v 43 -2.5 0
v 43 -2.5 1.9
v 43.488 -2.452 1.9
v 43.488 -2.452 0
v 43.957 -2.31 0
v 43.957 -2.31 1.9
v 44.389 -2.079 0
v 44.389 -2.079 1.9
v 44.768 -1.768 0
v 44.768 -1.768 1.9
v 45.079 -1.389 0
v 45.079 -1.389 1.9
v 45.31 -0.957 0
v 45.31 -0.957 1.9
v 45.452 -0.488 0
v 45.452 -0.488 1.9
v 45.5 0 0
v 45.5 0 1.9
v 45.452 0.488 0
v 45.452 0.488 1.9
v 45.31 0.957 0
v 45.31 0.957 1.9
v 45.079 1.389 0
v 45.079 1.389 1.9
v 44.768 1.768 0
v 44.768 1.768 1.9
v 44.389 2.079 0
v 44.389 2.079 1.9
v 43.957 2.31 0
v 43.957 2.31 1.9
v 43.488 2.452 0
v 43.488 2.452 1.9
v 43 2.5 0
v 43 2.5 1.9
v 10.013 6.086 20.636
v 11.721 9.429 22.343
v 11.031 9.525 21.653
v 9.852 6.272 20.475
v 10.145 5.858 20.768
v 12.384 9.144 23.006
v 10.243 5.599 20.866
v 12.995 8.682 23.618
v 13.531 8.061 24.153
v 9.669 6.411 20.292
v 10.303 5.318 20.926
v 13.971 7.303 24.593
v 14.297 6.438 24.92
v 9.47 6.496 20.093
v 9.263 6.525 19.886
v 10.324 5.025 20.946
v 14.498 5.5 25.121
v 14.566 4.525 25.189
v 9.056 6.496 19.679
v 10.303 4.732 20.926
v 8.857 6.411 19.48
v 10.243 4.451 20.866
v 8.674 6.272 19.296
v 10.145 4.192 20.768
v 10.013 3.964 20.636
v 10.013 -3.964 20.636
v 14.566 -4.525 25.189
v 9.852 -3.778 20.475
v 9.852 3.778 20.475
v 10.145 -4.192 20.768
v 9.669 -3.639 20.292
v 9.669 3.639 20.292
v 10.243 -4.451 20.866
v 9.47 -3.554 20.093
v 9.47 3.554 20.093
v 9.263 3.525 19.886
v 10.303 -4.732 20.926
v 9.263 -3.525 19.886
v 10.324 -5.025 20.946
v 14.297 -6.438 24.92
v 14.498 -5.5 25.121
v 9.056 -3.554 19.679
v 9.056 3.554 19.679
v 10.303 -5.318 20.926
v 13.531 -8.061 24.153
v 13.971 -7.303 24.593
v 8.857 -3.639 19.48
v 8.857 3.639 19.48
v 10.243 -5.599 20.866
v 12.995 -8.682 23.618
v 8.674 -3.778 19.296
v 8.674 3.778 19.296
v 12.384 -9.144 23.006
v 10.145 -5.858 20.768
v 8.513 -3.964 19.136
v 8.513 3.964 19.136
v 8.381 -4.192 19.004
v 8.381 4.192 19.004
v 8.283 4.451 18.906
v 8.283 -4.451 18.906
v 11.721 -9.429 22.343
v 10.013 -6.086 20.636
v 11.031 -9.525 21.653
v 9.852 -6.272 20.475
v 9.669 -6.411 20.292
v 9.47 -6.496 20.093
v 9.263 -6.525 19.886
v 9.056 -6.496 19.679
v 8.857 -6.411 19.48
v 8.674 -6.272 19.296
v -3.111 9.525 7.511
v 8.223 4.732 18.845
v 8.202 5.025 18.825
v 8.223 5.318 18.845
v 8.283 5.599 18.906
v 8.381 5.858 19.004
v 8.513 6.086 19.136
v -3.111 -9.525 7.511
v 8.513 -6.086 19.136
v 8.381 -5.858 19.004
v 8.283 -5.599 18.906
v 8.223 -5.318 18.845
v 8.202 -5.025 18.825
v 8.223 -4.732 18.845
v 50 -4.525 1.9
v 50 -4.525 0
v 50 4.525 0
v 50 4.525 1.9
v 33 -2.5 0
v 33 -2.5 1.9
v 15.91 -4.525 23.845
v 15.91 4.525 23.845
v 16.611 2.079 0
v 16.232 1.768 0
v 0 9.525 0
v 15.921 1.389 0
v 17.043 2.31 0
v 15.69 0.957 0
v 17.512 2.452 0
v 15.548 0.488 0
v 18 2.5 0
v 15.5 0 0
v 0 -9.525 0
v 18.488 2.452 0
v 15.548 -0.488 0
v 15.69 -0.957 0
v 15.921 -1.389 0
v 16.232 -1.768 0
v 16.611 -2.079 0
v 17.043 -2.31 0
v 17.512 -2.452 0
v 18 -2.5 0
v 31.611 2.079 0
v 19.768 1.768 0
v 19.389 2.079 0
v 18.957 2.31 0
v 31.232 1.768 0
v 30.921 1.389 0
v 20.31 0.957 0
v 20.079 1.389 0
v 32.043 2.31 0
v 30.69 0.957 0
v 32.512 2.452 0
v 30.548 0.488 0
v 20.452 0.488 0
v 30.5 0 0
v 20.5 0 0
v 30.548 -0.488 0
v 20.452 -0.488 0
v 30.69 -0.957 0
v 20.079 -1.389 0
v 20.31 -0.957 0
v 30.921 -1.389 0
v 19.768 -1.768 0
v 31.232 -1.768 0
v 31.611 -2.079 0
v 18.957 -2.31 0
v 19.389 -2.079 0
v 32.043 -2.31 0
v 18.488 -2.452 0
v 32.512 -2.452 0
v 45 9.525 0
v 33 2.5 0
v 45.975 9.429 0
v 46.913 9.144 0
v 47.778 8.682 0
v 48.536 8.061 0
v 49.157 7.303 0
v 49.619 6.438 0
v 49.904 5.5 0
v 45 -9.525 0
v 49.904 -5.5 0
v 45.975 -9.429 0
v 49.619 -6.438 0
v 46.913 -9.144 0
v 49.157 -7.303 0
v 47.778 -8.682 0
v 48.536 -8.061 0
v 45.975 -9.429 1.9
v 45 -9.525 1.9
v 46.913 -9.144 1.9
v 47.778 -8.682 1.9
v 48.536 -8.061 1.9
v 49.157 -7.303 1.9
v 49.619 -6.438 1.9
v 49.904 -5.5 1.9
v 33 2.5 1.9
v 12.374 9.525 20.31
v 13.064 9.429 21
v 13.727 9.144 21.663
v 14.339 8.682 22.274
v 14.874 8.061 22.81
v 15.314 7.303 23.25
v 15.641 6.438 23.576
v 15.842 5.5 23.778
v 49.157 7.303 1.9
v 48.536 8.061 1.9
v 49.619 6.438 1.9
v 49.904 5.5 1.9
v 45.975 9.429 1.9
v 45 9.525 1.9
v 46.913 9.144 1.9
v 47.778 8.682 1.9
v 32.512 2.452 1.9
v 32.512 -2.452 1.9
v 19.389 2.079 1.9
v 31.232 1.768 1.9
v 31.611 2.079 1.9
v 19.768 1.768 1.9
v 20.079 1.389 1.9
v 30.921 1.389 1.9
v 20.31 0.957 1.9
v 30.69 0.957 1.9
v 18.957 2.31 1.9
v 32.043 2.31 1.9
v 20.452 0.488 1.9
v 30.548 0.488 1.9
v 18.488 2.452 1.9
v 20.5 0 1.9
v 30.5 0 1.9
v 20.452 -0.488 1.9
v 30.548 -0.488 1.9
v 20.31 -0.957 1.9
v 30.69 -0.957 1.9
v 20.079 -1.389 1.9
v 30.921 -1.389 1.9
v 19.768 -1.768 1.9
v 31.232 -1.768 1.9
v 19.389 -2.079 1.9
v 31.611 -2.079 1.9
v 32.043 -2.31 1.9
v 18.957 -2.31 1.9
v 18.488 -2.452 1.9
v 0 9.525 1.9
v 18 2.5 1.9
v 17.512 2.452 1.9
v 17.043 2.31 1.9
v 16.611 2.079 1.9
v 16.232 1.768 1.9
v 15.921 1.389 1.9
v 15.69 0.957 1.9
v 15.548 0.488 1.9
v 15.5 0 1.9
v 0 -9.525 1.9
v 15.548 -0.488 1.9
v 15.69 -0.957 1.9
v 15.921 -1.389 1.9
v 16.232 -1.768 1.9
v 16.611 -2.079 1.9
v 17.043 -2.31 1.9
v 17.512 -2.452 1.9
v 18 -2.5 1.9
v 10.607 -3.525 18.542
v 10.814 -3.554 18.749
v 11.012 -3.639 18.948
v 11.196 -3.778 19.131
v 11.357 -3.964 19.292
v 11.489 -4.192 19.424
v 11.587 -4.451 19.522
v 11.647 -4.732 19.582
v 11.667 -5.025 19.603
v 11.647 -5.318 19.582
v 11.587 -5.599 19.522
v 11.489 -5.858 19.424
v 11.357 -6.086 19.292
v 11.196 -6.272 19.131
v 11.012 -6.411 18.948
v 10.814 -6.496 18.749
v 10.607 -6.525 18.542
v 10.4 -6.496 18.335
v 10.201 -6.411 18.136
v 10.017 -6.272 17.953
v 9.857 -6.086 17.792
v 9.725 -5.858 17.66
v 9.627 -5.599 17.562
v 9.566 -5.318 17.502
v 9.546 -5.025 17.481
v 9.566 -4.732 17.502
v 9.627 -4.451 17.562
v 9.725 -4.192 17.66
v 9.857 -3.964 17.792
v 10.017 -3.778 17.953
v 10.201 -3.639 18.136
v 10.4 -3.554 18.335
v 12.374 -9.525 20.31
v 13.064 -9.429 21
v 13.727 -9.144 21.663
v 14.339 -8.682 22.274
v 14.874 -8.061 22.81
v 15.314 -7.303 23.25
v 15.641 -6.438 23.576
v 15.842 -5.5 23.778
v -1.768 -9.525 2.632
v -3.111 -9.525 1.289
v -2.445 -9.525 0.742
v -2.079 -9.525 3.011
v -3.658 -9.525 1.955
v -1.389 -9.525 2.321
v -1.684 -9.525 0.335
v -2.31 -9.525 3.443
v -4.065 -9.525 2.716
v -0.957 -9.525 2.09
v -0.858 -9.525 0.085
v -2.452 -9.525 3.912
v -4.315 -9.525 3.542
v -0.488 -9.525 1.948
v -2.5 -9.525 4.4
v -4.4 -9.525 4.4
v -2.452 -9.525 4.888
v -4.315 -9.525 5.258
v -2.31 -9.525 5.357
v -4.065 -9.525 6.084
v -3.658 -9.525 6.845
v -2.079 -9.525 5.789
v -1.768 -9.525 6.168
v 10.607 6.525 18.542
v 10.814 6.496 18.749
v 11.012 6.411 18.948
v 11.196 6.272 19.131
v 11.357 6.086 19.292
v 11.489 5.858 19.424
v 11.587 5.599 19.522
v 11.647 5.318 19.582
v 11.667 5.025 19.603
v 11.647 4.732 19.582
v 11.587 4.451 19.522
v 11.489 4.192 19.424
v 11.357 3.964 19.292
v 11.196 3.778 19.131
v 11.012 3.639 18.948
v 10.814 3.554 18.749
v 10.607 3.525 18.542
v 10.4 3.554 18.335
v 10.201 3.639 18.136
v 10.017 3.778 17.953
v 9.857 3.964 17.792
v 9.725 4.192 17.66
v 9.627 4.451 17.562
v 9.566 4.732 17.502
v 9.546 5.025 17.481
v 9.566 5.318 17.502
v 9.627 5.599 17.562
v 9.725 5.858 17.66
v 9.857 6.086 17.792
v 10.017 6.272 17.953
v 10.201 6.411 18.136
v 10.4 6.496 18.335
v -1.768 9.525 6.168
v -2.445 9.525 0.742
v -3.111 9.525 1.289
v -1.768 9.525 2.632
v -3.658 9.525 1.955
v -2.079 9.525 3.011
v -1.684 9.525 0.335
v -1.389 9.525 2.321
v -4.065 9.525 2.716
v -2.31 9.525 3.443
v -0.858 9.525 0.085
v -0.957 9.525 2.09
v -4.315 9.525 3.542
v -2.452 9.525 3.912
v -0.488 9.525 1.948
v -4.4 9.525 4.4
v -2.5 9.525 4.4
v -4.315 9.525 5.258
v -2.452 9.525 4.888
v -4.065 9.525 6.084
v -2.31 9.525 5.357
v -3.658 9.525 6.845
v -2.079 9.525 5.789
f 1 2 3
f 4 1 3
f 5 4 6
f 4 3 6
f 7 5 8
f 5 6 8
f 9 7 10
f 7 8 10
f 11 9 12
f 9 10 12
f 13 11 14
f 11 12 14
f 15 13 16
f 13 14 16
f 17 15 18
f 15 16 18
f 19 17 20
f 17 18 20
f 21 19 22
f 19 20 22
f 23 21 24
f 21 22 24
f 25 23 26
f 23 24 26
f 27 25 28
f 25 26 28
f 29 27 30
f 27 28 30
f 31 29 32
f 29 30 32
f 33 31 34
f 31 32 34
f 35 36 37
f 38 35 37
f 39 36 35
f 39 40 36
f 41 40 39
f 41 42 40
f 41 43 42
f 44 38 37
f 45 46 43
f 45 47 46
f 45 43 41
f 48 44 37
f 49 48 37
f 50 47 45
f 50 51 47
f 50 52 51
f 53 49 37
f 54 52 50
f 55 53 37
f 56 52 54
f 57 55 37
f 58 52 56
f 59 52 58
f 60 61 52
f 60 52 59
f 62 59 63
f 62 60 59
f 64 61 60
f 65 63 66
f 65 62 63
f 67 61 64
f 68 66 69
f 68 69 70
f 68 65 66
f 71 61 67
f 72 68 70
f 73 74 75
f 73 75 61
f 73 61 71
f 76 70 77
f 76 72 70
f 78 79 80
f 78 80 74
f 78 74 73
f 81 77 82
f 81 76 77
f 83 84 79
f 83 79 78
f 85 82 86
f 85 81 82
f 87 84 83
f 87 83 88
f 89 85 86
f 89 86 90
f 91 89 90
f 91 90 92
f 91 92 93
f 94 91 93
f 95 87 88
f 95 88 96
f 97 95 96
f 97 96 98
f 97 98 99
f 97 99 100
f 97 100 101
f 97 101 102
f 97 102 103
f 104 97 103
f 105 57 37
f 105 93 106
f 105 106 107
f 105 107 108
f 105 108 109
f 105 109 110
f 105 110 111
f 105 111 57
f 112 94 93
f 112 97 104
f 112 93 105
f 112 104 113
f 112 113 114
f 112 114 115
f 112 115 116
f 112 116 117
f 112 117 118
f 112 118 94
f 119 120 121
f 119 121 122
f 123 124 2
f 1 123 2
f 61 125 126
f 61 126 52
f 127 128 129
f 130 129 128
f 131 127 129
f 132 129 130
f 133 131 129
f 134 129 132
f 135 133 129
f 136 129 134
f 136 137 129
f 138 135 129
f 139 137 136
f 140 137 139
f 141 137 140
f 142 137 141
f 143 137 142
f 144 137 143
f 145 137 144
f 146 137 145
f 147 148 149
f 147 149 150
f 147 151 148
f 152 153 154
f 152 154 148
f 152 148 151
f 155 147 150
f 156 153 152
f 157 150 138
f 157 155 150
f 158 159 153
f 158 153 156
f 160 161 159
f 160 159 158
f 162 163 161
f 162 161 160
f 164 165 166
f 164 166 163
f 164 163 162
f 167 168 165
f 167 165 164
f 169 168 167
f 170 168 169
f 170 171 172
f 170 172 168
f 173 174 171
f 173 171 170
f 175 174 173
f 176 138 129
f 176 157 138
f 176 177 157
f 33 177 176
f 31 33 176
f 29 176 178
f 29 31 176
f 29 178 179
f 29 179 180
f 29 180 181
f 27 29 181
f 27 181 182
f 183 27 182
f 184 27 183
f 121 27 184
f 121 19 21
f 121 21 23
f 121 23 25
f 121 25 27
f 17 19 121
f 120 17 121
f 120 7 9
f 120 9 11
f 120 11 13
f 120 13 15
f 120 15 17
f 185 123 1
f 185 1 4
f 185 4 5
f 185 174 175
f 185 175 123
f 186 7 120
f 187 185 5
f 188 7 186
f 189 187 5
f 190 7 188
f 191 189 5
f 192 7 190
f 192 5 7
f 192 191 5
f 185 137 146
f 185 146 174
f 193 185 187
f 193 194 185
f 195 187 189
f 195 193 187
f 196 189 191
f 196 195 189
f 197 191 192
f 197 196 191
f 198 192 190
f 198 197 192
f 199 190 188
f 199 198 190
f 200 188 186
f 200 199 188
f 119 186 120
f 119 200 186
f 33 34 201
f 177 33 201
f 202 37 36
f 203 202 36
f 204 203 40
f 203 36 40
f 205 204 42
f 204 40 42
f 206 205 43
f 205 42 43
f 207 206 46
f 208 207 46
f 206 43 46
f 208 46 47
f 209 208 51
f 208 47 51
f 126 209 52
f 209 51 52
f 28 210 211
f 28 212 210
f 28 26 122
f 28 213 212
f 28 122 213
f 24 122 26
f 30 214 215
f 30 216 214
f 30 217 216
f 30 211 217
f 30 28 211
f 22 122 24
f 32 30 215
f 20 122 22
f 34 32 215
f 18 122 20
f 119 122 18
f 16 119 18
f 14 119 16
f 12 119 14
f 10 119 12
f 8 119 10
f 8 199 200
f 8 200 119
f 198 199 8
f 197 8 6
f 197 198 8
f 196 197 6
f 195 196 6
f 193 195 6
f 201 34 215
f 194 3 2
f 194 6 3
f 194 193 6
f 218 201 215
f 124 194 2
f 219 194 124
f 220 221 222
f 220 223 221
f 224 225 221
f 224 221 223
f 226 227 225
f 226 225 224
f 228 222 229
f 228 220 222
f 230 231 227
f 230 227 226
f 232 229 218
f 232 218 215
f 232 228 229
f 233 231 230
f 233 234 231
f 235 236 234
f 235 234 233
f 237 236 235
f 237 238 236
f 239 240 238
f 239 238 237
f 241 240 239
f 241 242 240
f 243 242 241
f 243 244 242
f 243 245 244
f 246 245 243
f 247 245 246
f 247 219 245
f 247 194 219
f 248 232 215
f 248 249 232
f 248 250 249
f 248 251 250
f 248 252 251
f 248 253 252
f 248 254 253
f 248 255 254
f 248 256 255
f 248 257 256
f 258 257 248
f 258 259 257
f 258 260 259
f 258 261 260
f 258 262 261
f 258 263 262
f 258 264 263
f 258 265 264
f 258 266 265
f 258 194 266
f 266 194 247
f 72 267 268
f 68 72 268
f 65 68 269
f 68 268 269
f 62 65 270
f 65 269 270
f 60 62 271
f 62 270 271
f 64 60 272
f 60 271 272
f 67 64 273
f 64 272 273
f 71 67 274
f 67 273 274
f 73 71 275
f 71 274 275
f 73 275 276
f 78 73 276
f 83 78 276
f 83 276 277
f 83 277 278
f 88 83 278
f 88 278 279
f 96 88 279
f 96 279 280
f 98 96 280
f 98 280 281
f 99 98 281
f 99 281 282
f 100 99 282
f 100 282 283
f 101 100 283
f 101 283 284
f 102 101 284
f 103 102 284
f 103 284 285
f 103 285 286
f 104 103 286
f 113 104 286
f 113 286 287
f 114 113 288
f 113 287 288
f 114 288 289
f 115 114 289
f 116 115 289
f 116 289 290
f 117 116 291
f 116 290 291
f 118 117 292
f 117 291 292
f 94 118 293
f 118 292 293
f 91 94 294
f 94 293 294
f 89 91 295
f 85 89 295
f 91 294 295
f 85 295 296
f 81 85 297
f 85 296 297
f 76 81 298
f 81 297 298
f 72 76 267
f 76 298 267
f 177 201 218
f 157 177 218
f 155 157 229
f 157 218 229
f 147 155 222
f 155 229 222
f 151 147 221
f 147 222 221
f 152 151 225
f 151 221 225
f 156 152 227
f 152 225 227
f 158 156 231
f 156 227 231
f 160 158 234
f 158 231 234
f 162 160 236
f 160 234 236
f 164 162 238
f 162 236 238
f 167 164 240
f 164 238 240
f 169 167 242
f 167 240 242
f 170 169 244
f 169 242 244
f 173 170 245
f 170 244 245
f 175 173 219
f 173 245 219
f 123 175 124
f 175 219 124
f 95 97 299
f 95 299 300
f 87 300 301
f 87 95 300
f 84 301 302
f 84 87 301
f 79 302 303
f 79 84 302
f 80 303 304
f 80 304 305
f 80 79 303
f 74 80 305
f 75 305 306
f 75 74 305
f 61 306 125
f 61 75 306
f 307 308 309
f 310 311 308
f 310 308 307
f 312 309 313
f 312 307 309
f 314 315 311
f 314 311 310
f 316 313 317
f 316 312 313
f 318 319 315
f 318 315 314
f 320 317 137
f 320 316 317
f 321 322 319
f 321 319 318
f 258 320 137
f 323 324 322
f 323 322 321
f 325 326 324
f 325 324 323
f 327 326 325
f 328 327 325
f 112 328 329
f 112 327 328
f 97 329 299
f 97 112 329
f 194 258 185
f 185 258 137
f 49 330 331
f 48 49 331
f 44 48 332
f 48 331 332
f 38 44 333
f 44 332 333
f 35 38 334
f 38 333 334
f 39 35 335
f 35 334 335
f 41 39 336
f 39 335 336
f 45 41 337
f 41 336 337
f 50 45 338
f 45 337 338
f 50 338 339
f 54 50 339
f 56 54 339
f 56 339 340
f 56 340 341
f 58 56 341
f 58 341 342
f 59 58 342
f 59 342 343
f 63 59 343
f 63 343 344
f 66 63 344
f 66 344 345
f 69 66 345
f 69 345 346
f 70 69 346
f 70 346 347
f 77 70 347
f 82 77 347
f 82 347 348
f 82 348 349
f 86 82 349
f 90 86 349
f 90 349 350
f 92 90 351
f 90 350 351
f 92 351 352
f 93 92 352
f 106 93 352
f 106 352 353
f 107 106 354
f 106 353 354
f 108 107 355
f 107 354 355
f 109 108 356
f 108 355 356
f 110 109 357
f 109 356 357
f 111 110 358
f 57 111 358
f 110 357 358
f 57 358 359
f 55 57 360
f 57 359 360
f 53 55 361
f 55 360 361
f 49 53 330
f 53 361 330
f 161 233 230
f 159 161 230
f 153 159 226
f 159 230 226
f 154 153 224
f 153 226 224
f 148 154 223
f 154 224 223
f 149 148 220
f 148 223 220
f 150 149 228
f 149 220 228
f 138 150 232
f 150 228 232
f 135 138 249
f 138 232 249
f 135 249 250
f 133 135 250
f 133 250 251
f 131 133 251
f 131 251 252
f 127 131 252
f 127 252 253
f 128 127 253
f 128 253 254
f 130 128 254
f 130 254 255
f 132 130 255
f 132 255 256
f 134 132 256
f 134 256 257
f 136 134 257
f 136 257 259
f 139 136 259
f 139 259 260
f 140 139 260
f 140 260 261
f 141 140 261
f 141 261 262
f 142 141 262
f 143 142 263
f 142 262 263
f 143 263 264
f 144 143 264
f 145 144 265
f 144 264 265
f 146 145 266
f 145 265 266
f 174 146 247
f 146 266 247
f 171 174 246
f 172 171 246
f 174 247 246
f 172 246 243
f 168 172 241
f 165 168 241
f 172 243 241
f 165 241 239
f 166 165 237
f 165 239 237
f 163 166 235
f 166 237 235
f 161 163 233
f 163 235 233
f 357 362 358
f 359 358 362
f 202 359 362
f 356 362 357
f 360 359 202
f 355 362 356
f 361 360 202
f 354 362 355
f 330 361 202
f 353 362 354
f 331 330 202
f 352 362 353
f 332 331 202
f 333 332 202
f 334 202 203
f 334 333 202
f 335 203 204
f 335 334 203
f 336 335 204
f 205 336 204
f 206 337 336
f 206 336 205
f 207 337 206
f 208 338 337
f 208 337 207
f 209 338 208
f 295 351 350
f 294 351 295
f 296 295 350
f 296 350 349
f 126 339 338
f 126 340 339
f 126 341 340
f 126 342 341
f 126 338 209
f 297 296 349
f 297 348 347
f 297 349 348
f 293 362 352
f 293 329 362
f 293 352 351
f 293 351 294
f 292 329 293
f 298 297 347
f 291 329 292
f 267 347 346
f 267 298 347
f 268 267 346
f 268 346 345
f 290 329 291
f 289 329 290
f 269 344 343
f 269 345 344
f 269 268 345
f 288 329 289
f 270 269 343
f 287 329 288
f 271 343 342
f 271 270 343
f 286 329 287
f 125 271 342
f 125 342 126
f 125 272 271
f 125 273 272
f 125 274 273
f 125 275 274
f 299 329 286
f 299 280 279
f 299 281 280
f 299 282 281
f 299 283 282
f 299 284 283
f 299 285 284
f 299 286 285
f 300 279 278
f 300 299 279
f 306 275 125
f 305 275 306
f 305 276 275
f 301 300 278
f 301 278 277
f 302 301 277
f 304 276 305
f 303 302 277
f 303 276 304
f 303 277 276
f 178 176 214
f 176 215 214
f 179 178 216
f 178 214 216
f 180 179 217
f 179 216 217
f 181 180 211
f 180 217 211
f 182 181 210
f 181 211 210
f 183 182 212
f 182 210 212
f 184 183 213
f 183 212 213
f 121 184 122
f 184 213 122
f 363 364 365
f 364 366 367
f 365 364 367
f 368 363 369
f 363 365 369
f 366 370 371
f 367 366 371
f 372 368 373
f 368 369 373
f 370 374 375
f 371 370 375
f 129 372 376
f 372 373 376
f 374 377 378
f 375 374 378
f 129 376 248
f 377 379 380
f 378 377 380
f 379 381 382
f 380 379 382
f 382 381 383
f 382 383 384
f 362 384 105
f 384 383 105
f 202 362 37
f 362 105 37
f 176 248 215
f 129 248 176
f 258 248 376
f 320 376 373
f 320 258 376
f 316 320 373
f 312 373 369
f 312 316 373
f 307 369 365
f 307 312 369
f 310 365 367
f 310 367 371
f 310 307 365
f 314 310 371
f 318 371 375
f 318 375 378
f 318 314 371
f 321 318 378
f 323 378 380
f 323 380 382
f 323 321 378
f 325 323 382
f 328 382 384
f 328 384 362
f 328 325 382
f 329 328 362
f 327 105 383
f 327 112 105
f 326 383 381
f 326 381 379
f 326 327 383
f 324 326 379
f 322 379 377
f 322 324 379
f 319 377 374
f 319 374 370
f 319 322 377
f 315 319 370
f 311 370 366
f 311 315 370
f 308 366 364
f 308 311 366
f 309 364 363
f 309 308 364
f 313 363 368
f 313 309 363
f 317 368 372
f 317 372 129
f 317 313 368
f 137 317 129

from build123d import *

# Parameters (mm, degrees)
F1_DEPTH = 9.525
F3_D     = 3
F3_DEPTH = 12
F4_R     = 2.5
F5_DEPTH = 25
F6_R     = 5


with BuildPart() as f1:
    # F0 (on Front) → F1 (new body, symmetric)
    with BuildSketch(Plane.XZ):
        with BuildLine():
            ThreePointArc((-3.11127, 7.51127), (-4.06507, 2.716193), (0, 0))
            Line((0, 0), (50, 0))
            Line((50, 0), (50, 1.9))
            Line((50, 1.9), (0, 1.9))
            ThreePointArc((0, 1.9), (-2.309699, 3.443291), (-1.767767, 6.167767))
            Line((-1.767767, 6.167767), (15.909903, 23.845436))
            Line((15.909903, 23.845436), (14.5664, 25.188939))
            Line((14.5664, 25.188939), (-3.11127, 7.51127))
        make_face()
    extrude(amount=F1_DEPTH, both=True)

    # F3
    with Locations(Plane(origin=(-5.31127, 0, 5.31127), x_dir=(0, -1, 0), z_dir=(-0.707107, 0, 0.707107))):
        with Locations((-5.025, 20.61127), (5.025, 20.61127)):
            Hole(F3_D / 2, depth=F3_DEPTH)

    # F4 (on face) → F5 (cut)
    with BuildSketch(Plane.XY.offset(1.9)):
        with BuildLine():
            Line((33, -2.5), (43, -2.5))
            ThreePointArc((43, -2.5), (45.5, 0), (43, 2.5))
            Line((43, 2.5), (33, 2.5))
            ThreePointArc((33, 2.5), (30.5, 0), (33, -2.5))
        make_face()
        with Locations((18, 0)):
            Circle(F4_R)
    extrude(amount=-F5_DEPTH, mode=Mode.SUBTRACT)

    # F6
    f6_edges = [f1.edges().sort_by_distance(p)[0] for p in [
        (50, -9.525, 0.95),
        (50, 9.525, 0.95),
        (15.238151, -9.525, 24.517188),
        (15.238151, 9.525, 24.517188),
    ]]
    fillet(f6_edges, radius=F6_R)


solid = f1.part
